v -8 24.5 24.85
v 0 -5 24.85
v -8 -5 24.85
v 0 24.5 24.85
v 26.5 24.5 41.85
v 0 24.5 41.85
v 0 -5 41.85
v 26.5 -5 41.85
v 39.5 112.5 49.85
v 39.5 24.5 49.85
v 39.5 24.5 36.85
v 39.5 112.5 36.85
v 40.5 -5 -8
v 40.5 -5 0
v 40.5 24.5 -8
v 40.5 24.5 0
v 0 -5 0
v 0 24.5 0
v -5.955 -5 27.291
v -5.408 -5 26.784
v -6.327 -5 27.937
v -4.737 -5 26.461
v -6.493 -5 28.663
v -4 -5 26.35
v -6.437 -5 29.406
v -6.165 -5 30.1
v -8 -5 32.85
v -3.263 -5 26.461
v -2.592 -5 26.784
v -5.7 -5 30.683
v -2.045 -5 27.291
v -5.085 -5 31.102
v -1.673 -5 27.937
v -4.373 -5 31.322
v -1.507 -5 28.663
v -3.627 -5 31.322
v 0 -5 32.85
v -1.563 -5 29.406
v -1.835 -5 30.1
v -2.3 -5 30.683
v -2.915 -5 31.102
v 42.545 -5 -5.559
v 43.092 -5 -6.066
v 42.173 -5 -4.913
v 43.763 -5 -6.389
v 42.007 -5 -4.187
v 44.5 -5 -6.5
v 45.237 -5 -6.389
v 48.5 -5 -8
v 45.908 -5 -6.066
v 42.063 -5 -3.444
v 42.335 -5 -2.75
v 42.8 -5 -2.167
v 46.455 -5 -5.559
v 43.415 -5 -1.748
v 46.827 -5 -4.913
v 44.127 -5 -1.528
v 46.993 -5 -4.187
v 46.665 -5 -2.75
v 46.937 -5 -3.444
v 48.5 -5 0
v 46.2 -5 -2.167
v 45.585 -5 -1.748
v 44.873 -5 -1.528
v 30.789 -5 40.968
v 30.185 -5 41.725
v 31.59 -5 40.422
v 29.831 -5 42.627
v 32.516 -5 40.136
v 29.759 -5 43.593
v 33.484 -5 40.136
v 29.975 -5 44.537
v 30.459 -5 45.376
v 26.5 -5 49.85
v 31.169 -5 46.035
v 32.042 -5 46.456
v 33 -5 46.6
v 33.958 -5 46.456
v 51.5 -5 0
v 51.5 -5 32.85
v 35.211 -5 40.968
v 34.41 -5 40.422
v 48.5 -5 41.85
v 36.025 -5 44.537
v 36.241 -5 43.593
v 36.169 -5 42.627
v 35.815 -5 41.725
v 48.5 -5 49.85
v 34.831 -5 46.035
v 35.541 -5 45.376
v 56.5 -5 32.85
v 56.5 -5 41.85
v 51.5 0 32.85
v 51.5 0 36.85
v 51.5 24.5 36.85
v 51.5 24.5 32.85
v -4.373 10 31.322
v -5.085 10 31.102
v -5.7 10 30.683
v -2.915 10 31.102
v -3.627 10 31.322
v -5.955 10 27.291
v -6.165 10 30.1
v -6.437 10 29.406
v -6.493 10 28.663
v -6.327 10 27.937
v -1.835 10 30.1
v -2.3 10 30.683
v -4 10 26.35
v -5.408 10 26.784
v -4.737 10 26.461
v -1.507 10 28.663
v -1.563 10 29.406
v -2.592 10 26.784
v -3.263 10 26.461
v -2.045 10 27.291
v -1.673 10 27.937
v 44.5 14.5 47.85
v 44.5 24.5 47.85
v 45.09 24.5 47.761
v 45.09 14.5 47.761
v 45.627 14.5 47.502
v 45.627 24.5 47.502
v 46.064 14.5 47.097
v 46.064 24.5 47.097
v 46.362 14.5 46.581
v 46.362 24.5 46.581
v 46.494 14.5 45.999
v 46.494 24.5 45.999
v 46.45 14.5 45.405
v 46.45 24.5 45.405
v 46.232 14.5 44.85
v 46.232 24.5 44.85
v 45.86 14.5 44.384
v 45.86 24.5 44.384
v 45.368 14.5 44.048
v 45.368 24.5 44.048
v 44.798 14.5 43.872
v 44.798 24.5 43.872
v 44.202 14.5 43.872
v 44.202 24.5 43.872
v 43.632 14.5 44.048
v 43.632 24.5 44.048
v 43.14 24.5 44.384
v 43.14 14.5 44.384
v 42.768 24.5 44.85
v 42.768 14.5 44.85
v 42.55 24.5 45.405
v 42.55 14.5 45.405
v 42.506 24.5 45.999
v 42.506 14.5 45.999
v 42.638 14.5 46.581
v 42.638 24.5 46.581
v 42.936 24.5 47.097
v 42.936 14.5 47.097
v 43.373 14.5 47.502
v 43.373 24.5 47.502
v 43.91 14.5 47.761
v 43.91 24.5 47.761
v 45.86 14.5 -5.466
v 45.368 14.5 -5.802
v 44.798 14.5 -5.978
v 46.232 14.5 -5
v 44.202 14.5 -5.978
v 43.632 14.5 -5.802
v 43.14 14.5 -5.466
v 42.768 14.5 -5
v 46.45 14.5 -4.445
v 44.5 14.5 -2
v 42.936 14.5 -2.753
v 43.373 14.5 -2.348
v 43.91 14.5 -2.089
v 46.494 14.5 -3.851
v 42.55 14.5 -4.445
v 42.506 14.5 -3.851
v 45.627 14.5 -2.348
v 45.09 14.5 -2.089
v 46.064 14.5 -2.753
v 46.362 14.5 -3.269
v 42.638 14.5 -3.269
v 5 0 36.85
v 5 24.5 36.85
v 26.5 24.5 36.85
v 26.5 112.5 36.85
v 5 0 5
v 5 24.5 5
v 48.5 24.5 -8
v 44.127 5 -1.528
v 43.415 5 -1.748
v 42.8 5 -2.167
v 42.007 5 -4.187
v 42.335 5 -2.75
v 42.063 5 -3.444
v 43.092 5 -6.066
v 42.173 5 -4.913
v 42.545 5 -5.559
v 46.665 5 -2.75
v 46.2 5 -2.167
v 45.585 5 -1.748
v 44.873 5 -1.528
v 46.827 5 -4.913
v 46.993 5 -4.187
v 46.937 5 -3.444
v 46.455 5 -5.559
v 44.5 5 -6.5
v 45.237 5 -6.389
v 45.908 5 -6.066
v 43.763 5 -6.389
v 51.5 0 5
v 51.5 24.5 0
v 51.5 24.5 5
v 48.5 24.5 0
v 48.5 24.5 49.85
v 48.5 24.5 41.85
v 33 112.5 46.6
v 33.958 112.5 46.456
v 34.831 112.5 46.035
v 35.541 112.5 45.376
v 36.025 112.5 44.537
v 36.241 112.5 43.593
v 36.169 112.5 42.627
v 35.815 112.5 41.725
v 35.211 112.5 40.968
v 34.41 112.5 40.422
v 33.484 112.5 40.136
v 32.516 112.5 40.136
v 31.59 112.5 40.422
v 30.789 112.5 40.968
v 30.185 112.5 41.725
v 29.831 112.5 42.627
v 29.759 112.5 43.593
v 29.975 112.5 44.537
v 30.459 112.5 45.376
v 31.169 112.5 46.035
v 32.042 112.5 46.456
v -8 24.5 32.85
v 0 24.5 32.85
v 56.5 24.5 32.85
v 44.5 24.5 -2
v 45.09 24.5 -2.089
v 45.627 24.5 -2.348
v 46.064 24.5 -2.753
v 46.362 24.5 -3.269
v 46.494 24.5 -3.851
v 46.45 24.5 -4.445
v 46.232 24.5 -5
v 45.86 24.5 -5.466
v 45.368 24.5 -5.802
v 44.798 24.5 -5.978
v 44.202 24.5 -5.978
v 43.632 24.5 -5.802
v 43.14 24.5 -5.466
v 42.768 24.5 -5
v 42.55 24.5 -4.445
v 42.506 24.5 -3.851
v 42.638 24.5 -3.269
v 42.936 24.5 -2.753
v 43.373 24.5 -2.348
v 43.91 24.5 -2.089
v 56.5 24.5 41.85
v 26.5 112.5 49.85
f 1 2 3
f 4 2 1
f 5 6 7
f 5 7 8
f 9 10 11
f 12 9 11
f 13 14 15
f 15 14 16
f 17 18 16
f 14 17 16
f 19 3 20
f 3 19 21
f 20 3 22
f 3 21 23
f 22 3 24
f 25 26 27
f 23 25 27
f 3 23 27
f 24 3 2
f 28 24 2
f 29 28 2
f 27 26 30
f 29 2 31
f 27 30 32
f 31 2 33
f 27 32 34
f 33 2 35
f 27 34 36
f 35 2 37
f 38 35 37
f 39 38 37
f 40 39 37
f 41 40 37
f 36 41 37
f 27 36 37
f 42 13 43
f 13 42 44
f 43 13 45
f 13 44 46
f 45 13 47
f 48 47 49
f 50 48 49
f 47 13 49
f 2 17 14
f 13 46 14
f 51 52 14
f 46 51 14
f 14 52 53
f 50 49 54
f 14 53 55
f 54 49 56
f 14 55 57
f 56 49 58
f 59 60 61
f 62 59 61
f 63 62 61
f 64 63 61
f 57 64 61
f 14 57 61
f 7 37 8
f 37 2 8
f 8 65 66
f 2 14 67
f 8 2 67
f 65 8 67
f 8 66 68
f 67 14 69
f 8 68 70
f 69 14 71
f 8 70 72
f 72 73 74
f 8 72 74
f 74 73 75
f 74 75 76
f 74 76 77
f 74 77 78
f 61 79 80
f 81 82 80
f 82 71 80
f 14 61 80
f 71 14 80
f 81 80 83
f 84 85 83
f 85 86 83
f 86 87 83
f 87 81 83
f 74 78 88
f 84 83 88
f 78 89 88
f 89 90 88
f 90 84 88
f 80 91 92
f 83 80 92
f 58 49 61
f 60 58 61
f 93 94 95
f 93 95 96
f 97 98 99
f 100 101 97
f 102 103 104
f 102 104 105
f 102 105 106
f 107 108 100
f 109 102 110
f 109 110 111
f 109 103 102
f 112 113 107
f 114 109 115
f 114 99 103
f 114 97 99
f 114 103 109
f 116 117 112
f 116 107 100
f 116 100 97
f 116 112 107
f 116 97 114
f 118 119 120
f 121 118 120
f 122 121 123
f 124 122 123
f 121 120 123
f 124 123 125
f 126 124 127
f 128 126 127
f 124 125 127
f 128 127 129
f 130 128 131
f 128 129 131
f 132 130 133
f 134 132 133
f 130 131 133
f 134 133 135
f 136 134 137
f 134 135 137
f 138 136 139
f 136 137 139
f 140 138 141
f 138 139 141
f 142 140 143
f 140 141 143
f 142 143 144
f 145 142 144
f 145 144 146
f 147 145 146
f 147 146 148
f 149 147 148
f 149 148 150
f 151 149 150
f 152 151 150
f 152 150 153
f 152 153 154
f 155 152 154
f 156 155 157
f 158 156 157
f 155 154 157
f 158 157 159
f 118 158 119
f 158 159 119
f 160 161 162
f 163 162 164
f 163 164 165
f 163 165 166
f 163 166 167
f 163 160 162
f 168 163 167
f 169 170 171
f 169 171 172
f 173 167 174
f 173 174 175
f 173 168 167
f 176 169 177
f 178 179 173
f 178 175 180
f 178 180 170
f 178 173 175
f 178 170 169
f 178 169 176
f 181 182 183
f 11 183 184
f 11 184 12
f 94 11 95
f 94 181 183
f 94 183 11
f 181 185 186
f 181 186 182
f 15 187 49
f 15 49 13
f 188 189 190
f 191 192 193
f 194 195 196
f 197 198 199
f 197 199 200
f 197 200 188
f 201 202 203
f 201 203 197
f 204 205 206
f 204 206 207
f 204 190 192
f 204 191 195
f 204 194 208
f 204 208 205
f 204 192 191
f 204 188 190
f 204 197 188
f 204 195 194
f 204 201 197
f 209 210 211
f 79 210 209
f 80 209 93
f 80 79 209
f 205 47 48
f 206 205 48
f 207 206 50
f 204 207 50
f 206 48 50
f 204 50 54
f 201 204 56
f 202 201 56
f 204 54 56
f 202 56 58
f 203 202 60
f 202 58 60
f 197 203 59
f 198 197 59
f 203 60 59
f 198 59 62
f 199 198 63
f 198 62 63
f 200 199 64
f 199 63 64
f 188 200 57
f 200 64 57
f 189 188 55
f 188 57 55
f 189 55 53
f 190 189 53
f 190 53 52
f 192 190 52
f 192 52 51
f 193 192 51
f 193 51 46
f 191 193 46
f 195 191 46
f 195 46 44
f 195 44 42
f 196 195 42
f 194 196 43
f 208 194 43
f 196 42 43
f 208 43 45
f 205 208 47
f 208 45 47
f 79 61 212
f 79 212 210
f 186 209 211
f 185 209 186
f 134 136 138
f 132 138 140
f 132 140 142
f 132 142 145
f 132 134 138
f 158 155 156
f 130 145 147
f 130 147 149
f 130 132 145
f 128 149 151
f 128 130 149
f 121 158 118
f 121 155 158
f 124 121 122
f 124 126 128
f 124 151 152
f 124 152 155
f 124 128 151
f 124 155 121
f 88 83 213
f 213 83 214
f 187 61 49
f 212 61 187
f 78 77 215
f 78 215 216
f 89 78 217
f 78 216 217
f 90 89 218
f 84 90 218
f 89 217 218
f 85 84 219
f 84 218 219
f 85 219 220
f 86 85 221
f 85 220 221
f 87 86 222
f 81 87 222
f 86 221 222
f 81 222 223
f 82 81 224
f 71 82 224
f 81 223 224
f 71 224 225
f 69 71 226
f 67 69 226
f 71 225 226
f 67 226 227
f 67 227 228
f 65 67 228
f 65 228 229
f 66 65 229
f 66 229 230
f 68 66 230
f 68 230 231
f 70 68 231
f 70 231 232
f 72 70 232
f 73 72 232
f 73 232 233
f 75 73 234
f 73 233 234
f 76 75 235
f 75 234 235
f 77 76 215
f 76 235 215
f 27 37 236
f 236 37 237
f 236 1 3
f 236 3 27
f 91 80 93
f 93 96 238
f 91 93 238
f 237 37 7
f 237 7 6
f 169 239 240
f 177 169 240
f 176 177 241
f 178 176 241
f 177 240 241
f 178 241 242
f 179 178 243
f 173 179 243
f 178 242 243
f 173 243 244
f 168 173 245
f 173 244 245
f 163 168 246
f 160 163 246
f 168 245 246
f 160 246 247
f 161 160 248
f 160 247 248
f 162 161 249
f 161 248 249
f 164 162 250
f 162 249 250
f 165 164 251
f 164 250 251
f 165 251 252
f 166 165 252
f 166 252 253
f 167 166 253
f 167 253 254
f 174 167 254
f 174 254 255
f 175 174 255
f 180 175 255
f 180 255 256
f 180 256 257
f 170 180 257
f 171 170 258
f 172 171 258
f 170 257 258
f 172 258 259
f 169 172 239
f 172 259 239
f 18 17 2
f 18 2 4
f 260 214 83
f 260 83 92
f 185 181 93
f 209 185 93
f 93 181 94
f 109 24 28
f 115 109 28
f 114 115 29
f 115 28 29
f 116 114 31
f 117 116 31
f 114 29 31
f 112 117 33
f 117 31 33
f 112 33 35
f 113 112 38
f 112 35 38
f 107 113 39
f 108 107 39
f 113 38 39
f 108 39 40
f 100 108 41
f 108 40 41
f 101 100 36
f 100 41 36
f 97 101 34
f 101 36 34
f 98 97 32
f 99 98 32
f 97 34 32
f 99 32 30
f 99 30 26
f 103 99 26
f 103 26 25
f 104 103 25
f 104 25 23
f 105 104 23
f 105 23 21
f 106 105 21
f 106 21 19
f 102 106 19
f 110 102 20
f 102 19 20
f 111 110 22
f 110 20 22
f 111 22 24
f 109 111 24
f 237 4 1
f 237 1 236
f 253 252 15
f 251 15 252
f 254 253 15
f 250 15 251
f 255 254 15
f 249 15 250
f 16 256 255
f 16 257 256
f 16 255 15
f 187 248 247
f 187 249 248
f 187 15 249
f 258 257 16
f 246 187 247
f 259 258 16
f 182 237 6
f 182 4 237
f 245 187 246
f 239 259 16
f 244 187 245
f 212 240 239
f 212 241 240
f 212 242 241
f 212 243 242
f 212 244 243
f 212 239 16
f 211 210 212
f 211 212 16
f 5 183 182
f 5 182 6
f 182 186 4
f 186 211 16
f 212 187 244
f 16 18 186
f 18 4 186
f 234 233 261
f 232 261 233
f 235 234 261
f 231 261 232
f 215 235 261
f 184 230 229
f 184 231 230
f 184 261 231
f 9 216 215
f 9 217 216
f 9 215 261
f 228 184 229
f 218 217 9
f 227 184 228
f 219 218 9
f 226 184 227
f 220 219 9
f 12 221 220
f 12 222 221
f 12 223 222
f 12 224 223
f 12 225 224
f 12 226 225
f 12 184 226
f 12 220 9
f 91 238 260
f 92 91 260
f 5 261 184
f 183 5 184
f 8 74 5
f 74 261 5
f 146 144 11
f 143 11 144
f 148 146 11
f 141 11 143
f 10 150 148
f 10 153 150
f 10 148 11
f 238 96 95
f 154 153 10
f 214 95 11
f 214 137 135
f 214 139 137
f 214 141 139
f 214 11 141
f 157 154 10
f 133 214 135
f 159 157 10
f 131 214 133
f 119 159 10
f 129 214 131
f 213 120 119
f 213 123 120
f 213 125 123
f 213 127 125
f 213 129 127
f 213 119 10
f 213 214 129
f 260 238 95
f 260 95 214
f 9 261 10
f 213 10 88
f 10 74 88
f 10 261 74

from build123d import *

# Parameters (mm, degrees)
BOSS_EXTRUDE1_DEPTH  = 24.5
SKETCH2_W            = 103
SKETCH2_H            = 41.85
BOSS_EXTRUDE2_DEPTH  = 5
SKETCH3_W            = 46.5
SKETCH3_H            = 27.85
CUT_EXTRUDE1_DEPTH   = 26
SKETCH7_W            = 8
SKETCH7_H            = 3
BOSS_EXTRUDE3_DEPTH  = 8
SKETCH8_R            = 2.5
CUT_EXTRUDE2_DEPTH   = 8
SKETCH9_W            = 8
SKETCH9_H            = 3
BOSS_EXTRUDE4_DEPTH  = 8
SKETCH10_R           = 2.5
CUT_EXTRUDE3_DEPTH   = 8
SKETCH12_W           = 11.5
SKETCH12_H           = 5
CUT_EXTRUDE4_DEPTH   = 8
SKETCH14_W           = 8
SKETCH14_H           = 3
BOSS_EXTRUDE5_DEPTH  = 8
SKETCH15_R           = 2.5
CUT_EXTRUDE5_DEPTH   = 8
SKETCH16_W           = 8
SKETCH16_H           = 29.5
BOSS_EXTRUDE6_DEPTH  = 8
SKETCH17_W           = 14
SKETCH17_H           = 29.5
BOSS_EXTRUDE7_DEPTH  = 8
SKETCH18_R           = 2
CUT_EXTRUDE6_DEPTH   = 10
SKETCH19_W           = 8
SKETCH19_H           = 29.5
BOSS_EXTRUDE8_DEPTH  = 8
SKETCH20_W           = 13
SKETCH20_H           = 13
BOSS_EXTRUDE9_DEPTH  = 88
CUT_EXTRUDE8_DEPTH   = 48
SKETCH23_R           = 2.5
CUT_EXTRUDE9_DEPTH   = 10
SKETCH26_R           = 3.25
CUT_EXTRUDE11_DEPTH  = 117.5
SKETCH25_W           = 8
SKETCH25_H           = 3
CUT_EXTRUDE10_DEPTH  = 8
SKETCH27_W           = 8
SKETCH27_H           = 29.5
BOSS_EXTRUDE11_DEPTH = 8
SKETCH28_R           = 2.5
CUT_EXTRUDE12_DEPTH  = 15


with BuildPart() as part:
    # Sketch1 → Boss-Extrude1 (new body)
    with BuildSketch(Plane(origin=(0, 0, 0), x_dir=(1, 0, 0), z_dir=(0, 1, 0))):
        Polygon((0, 0), (51.5, 0), (51.5, -5), (5, -5), (5, -36.85), (51.5, -36.85), (51.5, -32.85), (56.5, -32.85), (56.5, -41.85), (0, -41.85), align=None)
    extrude(amount=BOSS_EXTRUDE1_DEPTH)

    # Sketch2 → Boss-Extrude2 (add)
    with BuildSketch(Plane.XZ):
        with Locations((51.5, 20.925)):
            Rectangle(SKETCH2_W, SKETCH2_H)
    extrude(amount=BOSS_EXTRUDE2_DEPTH)

    # Sketch3 → Cut-Extrude1 (cut)
    with BuildSketch(Plane(origin=(0, 0, 0), x_dir=(1, 0, 0), z_dir=(0, 1, 0))):
        with Locations((74.75, -18.925)):
            Rectangle(SKETCH3_W, SKETCH3_H)
    extrude(amount=-CUT_EXTRUDE1_DEPTH, mode=Mode.SUBTRACT)

    # Sketch7 → Boss-Extrude3 (add)
    with BuildSketch(Plane.XY.offset(41.85)):
        with Locations((4, -3.5)):
            Rectangle(SKETCH7_W, SKETCH7_H)
    extrude(amount=BOSS_EXTRUDE3_DEPTH)

    # Sketch8 → Cut-Extrude2 (cut)
    with BuildSketch(Plane(origin=(0, -2, 0), x_dir=(1, 0, 0), z_dir=(0, 1, 0))):
        with Locations(Location((4, -45.85, 0), (0, 0, 270))):
            Circle(SKETCH8_R)
    extrude(amount=-CUT_EXTRUDE2_DEPTH, mode=Mode.SUBTRACT)

    # Sketch9 → Boss-Extrude4 (add)
    with BuildSketch(Plane(origin=(0, 0, 0), x_dir=(-1, 0, 0), z_dir=(0, 0, -1))):
        with Locations((-99, -3.5)):
            Rectangle(SKETCH9_W, SKETCH9_H)
    extrude(amount=BOSS_EXTRUDE4_DEPTH)

    # Sketch10 → Cut-Extrude3 (cut)
    with BuildSketch(Plane(origin=(0, -2, 0), x_dir=(1, 0, 0), z_dir=(0, 1, 0))):
        with Locations(Location((99, 3.996680608, 0), (0, 0, 270))):
            Circle(SKETCH10_R)
    extrude(amount=-CUT_EXTRUDE3_DEPTH, mode=Mode.SUBTRACT)

    # Sketch12 → Cut-Extrude4 (cut)
    with BuildSketch(Plane(origin=(0, 0, 0), x_dir=(1, 0, 0), z_dir=(0, 1, 0))):
        with Locations((89.25, -2.5)):
            Rectangle(SKETCH12_W, SKETCH12_H)
    extrude(amount=-CUT_EXTRUDE4_DEPTH, mode=Mode.SUBTRACT)

    # Sketch14 → Boss-Extrude5 (add)
    with BuildSketch(Plane(origin=(0, 0, 0), x_dir=(-1, 0, 0), z_dir=(0, 0, -1))):
        with Locations((-79.5, -3.5)):
            Rectangle(SKETCH14_W, SKETCH14_H)
    extrude(amount=BOSS_EXTRUDE5_DEPTH)

    # Sketch15 → Cut-Extrude5 (cut)
    with BuildSketch(Plane(origin=(0, -2, 0), x_dir=(1, 0, 0), z_dir=(0, 1, 0))):
        with Locations(Location((79.5, 4, 0), (0, 0, 270))):
            Circle(SKETCH15_R)
    extrude(amount=-CUT_EXTRUDE5_DEPTH, mode=Mode.SUBTRACT)

    # Sketch16 → Boss-Extrude6 (add)
    with BuildSketch(Plane(origin=(0, 0, 0), x_dir=(-1, 0, 0), z_dir=(0, 0, -1))):
        with Locations((-44.5, 9.75)):
            Rectangle(SKETCH16_W, SKETCH16_H)
    extrude(amount=BOSS_EXTRUDE6_DEPTH)

    # Sketch17 → Boss-Extrude7 (add)
    with BuildSketch(Plane.XY.offset(41.85)):
        with Locations((41.5, 9.75)):
            Rectangle(SKETCH17_W, SKETCH17_H)
    extrude(amount=BOSS_EXTRUDE7_DEPTH)

    # Sketch18 → Cut-Extrude6 (cut)
    with BuildSketch(Plane(origin=(0, 24.5, 0), x_dir=(1, 0, 0), z_dir=(0, 1, 0))):
        with Locations(Location((44.5, 4, 0), (0, 0, 270))):
            Circle(SKETCH18_R)
        with Locations(Location((44.5, -45.85, 0), (0, 0, 270))):
            Circle(SKETCH18_R)
    extrude(amount=-CUT_EXTRUDE6_DEPTH, mode=Mode.SUBTRACT)

    # Sketch19 → Boss-Extrude8 (add)
    with BuildSketch(Plane.ZY.offset(-34.5)):
        with Locations((45.85, 9.75)):
            Rectangle(SKETCH19_W, SKETCH19_H)
    extrude(amount=BOSS_EXTRUDE8_DEPTH)

    # Sketch20 → Boss-Extrude9 (add)
    with BuildSketch(Plane(origin=(0, 24.5, 0), x_dir=(1, 0, 0), z_dir=(0, 1, 0))):
        with Locations((33, -43.35)):
            Rectangle(SKETCH20_W, SKETCH20_H)
    extrude(amount=BOSS_EXTRUDE9_DEPTH)

    # Sketch22 → Cut-Extrude8 (cut)
    with BuildSketch(Plane(origin=(0, 0, 0), x_dir=(1, 0, 0), z_dir=(0, 1, 0))):
        Polygon((103, 0), (103, 8), (51.5, 8), (51.5, -32.85), (56.5, -32.85), (98, -32.85), (98, -5), (95, -5), (95, 0), align=None)
        Polygon((103, -41.85), (103, -32.85), (98, -32.85), (56.5, -32.85), (56.5, -41.85), align=None)
        Polygon((103, -32.85), (103, 0), (95, 0), (95, -5), (98, -5), (98, -32.85), align=None)
    extrude(amount=-CUT_EXTRUDE8_DEPTH, mode=Mode.SUBTRACT)

    # Sketch23 → Cut-Extrude9 (cut)
    with BuildSketch(Plane.XZ.offset(5)):
        with Locations(Location((44.5, -4, 0), (0, 0, 270))):
            Circle(SKETCH23_R)
    extrude(amount=-CUT_EXTRUDE9_DEPTH, mode=Mode.SUBTRACT)

    # Sketch26 → Cut-Extrude11 (cut)
    with BuildSketch(Plane(origin=(0, 112.5, 0), x_dir=(1, 0, 0), z_dir=(0, 1, 0))):
        with Locations(Location((33, -43.35, 0), (0, 0, 270))):
            Circle(SKETCH26_R)
    extrude(amount=-CUT_EXTRUDE11_DEPTH, mode=Mode.SUBTRACT)

    # Sketch25 → Cut-Extrude10 (cut)
    with BuildSketch(Plane.XY.offset(49.85)):
        with Locations((4, -3.5)):
            Rectangle(SKETCH25_W, SKETCH25_H)
    extrude(amount=-CUT_EXTRUDE10_DEPTH, mode=Mode.SUBTRACT)

    # Sketch27 → Boss-Extrude11 (add)
    with BuildSketch(Plane.ZY):
        with Locations((28.85, 9.75)):
            Rectangle(SKETCH27_W, SKETCH27_H)
    extrude(amount=BOSS_EXTRUDE11_DEPTH)

    # Sketch28 → Cut-Extrude12 (cut)
    with BuildSketch(Plane.XZ.offset(5)):
        with Locations(Location((-4, 28.85, 0), (0, 0, 270))):
            Circle(SKETCH28_R)
    extrude(amount=-CUT_EXTRUDE12_DEPTH, mode=Mode.SUBTRACT)


solid = part.part
